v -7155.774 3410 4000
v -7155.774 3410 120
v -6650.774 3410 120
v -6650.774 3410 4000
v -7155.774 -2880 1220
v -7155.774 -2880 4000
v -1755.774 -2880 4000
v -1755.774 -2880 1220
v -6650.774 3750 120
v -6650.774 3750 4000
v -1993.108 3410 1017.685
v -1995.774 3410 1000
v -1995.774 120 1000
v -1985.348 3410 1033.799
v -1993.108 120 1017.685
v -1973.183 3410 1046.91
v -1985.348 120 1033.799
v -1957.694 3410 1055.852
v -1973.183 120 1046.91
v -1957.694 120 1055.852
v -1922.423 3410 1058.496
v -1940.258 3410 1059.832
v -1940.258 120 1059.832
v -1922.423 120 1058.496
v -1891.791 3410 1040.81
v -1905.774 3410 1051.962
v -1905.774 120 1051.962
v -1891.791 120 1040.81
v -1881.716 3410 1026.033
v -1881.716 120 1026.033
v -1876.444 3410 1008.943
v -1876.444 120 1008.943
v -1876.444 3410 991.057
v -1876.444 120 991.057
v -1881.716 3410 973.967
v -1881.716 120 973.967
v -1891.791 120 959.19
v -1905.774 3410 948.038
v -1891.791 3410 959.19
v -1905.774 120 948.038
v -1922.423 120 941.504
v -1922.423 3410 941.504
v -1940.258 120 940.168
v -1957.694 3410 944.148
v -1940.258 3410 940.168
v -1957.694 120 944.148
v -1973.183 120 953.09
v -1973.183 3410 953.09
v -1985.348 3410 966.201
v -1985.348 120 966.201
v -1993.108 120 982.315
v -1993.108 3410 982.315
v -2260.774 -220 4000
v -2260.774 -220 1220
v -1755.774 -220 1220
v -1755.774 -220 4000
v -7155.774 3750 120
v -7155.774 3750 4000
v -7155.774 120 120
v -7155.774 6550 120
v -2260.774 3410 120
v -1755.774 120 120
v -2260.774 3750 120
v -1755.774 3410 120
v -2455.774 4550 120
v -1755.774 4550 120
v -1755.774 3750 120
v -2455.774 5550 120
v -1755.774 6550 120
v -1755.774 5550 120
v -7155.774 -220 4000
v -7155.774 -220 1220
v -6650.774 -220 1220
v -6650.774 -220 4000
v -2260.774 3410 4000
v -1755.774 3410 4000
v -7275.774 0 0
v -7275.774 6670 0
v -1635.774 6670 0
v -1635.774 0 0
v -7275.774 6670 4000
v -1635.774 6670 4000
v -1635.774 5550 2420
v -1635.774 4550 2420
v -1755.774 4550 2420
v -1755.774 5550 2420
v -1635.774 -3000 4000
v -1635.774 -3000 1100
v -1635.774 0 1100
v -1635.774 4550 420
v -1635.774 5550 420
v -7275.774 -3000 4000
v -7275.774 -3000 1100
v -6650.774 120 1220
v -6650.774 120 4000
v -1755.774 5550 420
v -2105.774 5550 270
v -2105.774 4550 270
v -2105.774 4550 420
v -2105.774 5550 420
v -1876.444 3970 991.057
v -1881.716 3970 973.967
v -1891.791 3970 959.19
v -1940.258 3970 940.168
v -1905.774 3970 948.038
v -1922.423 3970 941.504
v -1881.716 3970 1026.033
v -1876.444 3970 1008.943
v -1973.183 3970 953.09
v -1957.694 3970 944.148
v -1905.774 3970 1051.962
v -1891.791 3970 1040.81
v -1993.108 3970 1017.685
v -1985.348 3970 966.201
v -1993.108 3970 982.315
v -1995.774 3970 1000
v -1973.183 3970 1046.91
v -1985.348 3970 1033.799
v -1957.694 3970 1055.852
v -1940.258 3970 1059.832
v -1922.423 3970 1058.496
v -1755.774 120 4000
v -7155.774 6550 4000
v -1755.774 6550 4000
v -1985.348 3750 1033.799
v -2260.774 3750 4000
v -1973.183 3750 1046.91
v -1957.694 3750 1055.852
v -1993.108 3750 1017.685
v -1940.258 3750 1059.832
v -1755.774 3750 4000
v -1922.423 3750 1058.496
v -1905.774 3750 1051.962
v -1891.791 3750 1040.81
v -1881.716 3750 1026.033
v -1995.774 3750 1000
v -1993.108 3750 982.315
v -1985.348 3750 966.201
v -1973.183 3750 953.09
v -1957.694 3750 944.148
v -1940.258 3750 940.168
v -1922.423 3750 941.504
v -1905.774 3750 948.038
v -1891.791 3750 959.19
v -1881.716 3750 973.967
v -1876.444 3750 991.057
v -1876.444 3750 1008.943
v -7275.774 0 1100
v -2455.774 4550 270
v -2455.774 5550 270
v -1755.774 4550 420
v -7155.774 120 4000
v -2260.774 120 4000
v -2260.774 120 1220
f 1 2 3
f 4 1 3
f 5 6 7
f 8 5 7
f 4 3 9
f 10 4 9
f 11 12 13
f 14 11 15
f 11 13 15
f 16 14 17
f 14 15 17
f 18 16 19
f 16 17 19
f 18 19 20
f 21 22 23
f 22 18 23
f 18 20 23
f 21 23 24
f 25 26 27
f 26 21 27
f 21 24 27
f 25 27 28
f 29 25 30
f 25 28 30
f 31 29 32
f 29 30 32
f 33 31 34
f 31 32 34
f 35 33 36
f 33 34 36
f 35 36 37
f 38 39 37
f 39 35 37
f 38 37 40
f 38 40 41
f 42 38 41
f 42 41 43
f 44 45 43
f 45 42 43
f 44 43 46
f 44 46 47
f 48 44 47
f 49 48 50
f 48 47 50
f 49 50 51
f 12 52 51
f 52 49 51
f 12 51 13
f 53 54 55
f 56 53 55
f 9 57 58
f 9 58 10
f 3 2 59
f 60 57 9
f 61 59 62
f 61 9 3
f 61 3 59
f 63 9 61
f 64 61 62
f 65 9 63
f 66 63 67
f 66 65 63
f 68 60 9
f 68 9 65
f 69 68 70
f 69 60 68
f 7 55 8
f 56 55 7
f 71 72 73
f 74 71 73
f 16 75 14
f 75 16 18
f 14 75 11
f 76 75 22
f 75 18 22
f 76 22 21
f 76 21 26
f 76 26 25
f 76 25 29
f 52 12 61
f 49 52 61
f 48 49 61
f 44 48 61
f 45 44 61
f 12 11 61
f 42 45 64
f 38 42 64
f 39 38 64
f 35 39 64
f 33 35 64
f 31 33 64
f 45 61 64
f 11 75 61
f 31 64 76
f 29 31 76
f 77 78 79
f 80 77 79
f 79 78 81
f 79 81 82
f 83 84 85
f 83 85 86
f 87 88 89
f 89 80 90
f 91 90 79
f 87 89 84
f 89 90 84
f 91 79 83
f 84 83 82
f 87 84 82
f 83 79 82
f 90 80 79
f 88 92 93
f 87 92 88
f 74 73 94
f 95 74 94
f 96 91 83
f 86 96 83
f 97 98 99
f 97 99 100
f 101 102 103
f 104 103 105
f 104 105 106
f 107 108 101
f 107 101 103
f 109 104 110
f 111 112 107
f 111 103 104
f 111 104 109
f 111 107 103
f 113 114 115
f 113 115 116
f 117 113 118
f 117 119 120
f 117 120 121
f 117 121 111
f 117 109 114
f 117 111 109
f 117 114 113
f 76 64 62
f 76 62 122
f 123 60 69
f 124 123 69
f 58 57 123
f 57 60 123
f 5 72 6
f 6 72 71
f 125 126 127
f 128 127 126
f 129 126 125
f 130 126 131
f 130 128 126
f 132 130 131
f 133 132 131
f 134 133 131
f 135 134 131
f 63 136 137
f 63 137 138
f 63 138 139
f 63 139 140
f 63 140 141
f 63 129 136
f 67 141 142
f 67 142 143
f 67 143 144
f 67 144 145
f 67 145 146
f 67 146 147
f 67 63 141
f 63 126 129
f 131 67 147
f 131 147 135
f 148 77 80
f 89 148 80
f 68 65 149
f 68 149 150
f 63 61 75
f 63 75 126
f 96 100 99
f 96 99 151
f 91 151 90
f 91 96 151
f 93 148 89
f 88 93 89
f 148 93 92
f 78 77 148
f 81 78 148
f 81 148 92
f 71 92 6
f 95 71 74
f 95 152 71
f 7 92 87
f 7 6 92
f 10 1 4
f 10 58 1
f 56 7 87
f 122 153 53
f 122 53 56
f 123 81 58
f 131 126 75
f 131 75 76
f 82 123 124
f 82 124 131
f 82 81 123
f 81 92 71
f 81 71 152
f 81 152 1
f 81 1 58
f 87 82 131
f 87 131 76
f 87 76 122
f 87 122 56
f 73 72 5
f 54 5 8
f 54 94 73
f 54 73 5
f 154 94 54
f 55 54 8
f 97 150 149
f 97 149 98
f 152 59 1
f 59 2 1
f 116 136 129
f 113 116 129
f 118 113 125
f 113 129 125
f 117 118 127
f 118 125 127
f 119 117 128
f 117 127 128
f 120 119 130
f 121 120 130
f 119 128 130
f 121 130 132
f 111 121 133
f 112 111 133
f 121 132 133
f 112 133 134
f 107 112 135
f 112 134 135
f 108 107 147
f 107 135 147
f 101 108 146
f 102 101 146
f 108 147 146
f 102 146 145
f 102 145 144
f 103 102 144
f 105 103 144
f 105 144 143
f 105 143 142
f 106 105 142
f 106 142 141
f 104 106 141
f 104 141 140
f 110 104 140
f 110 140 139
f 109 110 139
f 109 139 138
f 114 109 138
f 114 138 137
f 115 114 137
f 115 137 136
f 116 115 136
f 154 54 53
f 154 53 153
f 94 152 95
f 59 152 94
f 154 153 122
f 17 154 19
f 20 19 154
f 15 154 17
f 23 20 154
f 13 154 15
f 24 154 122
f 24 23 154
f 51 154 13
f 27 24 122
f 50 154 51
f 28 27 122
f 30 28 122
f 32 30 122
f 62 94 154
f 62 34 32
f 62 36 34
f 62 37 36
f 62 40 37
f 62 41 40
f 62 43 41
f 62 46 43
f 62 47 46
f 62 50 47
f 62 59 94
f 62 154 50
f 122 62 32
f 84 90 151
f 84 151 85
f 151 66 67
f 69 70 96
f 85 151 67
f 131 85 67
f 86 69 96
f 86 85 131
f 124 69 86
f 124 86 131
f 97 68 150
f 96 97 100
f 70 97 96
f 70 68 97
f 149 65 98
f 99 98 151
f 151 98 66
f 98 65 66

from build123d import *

# Parameters (mm, degrees)
F0_W      = 5640
F0_H      = 6670
F1_DEPTH  = 4000
F2_W      = 5640
F2_H      = 2900
F3_DEPTH  = 3000
F4_T      = -120
F5_W      = 505
F5_H      = 340
F6_DEPTH  = 3880
F7_R      = 60
F8_DEPTH  = 3850
F9_W      = 350
F9_H      = 1000
F10_DEPTH = 300
F11_DEPTH = 150
F12_W     = 1000
F12_H     = 2000
F13_DEPTH = 120
F14_W     = 505
F14_H     = 340
F15_DEPTH = 2780


with BuildPart() as f1:
    # F0 (on Top) → F1 (new body)
    with BuildSketch(Plane.XY):
        with Locations((-4455.7737725742, 3335)):
            Rectangle(F0_W, F0_H)
    extrude(amount=F1_DEPTH)

    # F2 (on face) → F3 (join)
    with BuildSketch(Plane.XZ):
        with Locations((-4455.7737725742, 2550)):
            Rectangle(F2_W, F2_H)
    extrude(amount=F3_DEPTH)

    # F4
    f4_openings = [f1.faces().sort_by_distance(p)[0] for p in [
        (-4455.773773, 1835, 4000),
    ]]
    offset(amount=F4_T, openings=f4_openings, kind=Kind.INTERSECTION)

    # F5 (on face) → F6 (join)
    with BuildSketch(Plane.XY.offset(120)):
        with Locations((-6903.2737725742, 3580)):
            Rectangle(F5_W, F5_H)
        with Locations((-2008.2737725742, 3580)):
            Rectangle(F5_W, F5_H)
    extrude(amount=F6_DEPTH)

    # F7 (on face) → F8 (join)
    with BuildSketch(Plane(origin=(0, 120, 0), x_dir=(-1, 0, 0), z_dir=(0, 1, 0))):
        with Locations((1935.7737725742, 1000)):
            Circle(F7_R)
    extrude(amount=F8_DEPTH)

    # F9 (on face) → F10 (join)
    with BuildSketch(Plane.XY.offset(120)):
        with Locations((-1930.7737725742, 5050)):
            Rectangle(F9_W, F9_H)
    extrude(amount=F10_DEPTH)

    # F9 (on face) → F11 (join)
    with BuildSketch(Plane.XY.offset(120)):
        with Locations((-2280.7737725742, 5050)):
            Rectangle(F9_W, F9_H)
    extrude(amount=F11_DEPTH)

    # F12 (on face) → F13 (cut)
    with BuildSketch(Plane.YZ.offset(-1635.7737725742)):
        with Locations((5050, 1420)):
            Rectangle(F12_W, F12_H)
    extrude(amount=-F13_DEPTH, mode=Mode.SUBTRACT)

    # F14 (on face) → F15 (join)
    with BuildSketch(Plane.XY.offset(1220)):
        with Locations((-2008.2737725742, -50)):
            Rectangle(F14_W, F14_H)
        with Locations((-6903.2737725742, -50)):
            Rectangle(F14_W, F14_H)
    extrude(amount=F15_DEPTH)


solid = f1.part
